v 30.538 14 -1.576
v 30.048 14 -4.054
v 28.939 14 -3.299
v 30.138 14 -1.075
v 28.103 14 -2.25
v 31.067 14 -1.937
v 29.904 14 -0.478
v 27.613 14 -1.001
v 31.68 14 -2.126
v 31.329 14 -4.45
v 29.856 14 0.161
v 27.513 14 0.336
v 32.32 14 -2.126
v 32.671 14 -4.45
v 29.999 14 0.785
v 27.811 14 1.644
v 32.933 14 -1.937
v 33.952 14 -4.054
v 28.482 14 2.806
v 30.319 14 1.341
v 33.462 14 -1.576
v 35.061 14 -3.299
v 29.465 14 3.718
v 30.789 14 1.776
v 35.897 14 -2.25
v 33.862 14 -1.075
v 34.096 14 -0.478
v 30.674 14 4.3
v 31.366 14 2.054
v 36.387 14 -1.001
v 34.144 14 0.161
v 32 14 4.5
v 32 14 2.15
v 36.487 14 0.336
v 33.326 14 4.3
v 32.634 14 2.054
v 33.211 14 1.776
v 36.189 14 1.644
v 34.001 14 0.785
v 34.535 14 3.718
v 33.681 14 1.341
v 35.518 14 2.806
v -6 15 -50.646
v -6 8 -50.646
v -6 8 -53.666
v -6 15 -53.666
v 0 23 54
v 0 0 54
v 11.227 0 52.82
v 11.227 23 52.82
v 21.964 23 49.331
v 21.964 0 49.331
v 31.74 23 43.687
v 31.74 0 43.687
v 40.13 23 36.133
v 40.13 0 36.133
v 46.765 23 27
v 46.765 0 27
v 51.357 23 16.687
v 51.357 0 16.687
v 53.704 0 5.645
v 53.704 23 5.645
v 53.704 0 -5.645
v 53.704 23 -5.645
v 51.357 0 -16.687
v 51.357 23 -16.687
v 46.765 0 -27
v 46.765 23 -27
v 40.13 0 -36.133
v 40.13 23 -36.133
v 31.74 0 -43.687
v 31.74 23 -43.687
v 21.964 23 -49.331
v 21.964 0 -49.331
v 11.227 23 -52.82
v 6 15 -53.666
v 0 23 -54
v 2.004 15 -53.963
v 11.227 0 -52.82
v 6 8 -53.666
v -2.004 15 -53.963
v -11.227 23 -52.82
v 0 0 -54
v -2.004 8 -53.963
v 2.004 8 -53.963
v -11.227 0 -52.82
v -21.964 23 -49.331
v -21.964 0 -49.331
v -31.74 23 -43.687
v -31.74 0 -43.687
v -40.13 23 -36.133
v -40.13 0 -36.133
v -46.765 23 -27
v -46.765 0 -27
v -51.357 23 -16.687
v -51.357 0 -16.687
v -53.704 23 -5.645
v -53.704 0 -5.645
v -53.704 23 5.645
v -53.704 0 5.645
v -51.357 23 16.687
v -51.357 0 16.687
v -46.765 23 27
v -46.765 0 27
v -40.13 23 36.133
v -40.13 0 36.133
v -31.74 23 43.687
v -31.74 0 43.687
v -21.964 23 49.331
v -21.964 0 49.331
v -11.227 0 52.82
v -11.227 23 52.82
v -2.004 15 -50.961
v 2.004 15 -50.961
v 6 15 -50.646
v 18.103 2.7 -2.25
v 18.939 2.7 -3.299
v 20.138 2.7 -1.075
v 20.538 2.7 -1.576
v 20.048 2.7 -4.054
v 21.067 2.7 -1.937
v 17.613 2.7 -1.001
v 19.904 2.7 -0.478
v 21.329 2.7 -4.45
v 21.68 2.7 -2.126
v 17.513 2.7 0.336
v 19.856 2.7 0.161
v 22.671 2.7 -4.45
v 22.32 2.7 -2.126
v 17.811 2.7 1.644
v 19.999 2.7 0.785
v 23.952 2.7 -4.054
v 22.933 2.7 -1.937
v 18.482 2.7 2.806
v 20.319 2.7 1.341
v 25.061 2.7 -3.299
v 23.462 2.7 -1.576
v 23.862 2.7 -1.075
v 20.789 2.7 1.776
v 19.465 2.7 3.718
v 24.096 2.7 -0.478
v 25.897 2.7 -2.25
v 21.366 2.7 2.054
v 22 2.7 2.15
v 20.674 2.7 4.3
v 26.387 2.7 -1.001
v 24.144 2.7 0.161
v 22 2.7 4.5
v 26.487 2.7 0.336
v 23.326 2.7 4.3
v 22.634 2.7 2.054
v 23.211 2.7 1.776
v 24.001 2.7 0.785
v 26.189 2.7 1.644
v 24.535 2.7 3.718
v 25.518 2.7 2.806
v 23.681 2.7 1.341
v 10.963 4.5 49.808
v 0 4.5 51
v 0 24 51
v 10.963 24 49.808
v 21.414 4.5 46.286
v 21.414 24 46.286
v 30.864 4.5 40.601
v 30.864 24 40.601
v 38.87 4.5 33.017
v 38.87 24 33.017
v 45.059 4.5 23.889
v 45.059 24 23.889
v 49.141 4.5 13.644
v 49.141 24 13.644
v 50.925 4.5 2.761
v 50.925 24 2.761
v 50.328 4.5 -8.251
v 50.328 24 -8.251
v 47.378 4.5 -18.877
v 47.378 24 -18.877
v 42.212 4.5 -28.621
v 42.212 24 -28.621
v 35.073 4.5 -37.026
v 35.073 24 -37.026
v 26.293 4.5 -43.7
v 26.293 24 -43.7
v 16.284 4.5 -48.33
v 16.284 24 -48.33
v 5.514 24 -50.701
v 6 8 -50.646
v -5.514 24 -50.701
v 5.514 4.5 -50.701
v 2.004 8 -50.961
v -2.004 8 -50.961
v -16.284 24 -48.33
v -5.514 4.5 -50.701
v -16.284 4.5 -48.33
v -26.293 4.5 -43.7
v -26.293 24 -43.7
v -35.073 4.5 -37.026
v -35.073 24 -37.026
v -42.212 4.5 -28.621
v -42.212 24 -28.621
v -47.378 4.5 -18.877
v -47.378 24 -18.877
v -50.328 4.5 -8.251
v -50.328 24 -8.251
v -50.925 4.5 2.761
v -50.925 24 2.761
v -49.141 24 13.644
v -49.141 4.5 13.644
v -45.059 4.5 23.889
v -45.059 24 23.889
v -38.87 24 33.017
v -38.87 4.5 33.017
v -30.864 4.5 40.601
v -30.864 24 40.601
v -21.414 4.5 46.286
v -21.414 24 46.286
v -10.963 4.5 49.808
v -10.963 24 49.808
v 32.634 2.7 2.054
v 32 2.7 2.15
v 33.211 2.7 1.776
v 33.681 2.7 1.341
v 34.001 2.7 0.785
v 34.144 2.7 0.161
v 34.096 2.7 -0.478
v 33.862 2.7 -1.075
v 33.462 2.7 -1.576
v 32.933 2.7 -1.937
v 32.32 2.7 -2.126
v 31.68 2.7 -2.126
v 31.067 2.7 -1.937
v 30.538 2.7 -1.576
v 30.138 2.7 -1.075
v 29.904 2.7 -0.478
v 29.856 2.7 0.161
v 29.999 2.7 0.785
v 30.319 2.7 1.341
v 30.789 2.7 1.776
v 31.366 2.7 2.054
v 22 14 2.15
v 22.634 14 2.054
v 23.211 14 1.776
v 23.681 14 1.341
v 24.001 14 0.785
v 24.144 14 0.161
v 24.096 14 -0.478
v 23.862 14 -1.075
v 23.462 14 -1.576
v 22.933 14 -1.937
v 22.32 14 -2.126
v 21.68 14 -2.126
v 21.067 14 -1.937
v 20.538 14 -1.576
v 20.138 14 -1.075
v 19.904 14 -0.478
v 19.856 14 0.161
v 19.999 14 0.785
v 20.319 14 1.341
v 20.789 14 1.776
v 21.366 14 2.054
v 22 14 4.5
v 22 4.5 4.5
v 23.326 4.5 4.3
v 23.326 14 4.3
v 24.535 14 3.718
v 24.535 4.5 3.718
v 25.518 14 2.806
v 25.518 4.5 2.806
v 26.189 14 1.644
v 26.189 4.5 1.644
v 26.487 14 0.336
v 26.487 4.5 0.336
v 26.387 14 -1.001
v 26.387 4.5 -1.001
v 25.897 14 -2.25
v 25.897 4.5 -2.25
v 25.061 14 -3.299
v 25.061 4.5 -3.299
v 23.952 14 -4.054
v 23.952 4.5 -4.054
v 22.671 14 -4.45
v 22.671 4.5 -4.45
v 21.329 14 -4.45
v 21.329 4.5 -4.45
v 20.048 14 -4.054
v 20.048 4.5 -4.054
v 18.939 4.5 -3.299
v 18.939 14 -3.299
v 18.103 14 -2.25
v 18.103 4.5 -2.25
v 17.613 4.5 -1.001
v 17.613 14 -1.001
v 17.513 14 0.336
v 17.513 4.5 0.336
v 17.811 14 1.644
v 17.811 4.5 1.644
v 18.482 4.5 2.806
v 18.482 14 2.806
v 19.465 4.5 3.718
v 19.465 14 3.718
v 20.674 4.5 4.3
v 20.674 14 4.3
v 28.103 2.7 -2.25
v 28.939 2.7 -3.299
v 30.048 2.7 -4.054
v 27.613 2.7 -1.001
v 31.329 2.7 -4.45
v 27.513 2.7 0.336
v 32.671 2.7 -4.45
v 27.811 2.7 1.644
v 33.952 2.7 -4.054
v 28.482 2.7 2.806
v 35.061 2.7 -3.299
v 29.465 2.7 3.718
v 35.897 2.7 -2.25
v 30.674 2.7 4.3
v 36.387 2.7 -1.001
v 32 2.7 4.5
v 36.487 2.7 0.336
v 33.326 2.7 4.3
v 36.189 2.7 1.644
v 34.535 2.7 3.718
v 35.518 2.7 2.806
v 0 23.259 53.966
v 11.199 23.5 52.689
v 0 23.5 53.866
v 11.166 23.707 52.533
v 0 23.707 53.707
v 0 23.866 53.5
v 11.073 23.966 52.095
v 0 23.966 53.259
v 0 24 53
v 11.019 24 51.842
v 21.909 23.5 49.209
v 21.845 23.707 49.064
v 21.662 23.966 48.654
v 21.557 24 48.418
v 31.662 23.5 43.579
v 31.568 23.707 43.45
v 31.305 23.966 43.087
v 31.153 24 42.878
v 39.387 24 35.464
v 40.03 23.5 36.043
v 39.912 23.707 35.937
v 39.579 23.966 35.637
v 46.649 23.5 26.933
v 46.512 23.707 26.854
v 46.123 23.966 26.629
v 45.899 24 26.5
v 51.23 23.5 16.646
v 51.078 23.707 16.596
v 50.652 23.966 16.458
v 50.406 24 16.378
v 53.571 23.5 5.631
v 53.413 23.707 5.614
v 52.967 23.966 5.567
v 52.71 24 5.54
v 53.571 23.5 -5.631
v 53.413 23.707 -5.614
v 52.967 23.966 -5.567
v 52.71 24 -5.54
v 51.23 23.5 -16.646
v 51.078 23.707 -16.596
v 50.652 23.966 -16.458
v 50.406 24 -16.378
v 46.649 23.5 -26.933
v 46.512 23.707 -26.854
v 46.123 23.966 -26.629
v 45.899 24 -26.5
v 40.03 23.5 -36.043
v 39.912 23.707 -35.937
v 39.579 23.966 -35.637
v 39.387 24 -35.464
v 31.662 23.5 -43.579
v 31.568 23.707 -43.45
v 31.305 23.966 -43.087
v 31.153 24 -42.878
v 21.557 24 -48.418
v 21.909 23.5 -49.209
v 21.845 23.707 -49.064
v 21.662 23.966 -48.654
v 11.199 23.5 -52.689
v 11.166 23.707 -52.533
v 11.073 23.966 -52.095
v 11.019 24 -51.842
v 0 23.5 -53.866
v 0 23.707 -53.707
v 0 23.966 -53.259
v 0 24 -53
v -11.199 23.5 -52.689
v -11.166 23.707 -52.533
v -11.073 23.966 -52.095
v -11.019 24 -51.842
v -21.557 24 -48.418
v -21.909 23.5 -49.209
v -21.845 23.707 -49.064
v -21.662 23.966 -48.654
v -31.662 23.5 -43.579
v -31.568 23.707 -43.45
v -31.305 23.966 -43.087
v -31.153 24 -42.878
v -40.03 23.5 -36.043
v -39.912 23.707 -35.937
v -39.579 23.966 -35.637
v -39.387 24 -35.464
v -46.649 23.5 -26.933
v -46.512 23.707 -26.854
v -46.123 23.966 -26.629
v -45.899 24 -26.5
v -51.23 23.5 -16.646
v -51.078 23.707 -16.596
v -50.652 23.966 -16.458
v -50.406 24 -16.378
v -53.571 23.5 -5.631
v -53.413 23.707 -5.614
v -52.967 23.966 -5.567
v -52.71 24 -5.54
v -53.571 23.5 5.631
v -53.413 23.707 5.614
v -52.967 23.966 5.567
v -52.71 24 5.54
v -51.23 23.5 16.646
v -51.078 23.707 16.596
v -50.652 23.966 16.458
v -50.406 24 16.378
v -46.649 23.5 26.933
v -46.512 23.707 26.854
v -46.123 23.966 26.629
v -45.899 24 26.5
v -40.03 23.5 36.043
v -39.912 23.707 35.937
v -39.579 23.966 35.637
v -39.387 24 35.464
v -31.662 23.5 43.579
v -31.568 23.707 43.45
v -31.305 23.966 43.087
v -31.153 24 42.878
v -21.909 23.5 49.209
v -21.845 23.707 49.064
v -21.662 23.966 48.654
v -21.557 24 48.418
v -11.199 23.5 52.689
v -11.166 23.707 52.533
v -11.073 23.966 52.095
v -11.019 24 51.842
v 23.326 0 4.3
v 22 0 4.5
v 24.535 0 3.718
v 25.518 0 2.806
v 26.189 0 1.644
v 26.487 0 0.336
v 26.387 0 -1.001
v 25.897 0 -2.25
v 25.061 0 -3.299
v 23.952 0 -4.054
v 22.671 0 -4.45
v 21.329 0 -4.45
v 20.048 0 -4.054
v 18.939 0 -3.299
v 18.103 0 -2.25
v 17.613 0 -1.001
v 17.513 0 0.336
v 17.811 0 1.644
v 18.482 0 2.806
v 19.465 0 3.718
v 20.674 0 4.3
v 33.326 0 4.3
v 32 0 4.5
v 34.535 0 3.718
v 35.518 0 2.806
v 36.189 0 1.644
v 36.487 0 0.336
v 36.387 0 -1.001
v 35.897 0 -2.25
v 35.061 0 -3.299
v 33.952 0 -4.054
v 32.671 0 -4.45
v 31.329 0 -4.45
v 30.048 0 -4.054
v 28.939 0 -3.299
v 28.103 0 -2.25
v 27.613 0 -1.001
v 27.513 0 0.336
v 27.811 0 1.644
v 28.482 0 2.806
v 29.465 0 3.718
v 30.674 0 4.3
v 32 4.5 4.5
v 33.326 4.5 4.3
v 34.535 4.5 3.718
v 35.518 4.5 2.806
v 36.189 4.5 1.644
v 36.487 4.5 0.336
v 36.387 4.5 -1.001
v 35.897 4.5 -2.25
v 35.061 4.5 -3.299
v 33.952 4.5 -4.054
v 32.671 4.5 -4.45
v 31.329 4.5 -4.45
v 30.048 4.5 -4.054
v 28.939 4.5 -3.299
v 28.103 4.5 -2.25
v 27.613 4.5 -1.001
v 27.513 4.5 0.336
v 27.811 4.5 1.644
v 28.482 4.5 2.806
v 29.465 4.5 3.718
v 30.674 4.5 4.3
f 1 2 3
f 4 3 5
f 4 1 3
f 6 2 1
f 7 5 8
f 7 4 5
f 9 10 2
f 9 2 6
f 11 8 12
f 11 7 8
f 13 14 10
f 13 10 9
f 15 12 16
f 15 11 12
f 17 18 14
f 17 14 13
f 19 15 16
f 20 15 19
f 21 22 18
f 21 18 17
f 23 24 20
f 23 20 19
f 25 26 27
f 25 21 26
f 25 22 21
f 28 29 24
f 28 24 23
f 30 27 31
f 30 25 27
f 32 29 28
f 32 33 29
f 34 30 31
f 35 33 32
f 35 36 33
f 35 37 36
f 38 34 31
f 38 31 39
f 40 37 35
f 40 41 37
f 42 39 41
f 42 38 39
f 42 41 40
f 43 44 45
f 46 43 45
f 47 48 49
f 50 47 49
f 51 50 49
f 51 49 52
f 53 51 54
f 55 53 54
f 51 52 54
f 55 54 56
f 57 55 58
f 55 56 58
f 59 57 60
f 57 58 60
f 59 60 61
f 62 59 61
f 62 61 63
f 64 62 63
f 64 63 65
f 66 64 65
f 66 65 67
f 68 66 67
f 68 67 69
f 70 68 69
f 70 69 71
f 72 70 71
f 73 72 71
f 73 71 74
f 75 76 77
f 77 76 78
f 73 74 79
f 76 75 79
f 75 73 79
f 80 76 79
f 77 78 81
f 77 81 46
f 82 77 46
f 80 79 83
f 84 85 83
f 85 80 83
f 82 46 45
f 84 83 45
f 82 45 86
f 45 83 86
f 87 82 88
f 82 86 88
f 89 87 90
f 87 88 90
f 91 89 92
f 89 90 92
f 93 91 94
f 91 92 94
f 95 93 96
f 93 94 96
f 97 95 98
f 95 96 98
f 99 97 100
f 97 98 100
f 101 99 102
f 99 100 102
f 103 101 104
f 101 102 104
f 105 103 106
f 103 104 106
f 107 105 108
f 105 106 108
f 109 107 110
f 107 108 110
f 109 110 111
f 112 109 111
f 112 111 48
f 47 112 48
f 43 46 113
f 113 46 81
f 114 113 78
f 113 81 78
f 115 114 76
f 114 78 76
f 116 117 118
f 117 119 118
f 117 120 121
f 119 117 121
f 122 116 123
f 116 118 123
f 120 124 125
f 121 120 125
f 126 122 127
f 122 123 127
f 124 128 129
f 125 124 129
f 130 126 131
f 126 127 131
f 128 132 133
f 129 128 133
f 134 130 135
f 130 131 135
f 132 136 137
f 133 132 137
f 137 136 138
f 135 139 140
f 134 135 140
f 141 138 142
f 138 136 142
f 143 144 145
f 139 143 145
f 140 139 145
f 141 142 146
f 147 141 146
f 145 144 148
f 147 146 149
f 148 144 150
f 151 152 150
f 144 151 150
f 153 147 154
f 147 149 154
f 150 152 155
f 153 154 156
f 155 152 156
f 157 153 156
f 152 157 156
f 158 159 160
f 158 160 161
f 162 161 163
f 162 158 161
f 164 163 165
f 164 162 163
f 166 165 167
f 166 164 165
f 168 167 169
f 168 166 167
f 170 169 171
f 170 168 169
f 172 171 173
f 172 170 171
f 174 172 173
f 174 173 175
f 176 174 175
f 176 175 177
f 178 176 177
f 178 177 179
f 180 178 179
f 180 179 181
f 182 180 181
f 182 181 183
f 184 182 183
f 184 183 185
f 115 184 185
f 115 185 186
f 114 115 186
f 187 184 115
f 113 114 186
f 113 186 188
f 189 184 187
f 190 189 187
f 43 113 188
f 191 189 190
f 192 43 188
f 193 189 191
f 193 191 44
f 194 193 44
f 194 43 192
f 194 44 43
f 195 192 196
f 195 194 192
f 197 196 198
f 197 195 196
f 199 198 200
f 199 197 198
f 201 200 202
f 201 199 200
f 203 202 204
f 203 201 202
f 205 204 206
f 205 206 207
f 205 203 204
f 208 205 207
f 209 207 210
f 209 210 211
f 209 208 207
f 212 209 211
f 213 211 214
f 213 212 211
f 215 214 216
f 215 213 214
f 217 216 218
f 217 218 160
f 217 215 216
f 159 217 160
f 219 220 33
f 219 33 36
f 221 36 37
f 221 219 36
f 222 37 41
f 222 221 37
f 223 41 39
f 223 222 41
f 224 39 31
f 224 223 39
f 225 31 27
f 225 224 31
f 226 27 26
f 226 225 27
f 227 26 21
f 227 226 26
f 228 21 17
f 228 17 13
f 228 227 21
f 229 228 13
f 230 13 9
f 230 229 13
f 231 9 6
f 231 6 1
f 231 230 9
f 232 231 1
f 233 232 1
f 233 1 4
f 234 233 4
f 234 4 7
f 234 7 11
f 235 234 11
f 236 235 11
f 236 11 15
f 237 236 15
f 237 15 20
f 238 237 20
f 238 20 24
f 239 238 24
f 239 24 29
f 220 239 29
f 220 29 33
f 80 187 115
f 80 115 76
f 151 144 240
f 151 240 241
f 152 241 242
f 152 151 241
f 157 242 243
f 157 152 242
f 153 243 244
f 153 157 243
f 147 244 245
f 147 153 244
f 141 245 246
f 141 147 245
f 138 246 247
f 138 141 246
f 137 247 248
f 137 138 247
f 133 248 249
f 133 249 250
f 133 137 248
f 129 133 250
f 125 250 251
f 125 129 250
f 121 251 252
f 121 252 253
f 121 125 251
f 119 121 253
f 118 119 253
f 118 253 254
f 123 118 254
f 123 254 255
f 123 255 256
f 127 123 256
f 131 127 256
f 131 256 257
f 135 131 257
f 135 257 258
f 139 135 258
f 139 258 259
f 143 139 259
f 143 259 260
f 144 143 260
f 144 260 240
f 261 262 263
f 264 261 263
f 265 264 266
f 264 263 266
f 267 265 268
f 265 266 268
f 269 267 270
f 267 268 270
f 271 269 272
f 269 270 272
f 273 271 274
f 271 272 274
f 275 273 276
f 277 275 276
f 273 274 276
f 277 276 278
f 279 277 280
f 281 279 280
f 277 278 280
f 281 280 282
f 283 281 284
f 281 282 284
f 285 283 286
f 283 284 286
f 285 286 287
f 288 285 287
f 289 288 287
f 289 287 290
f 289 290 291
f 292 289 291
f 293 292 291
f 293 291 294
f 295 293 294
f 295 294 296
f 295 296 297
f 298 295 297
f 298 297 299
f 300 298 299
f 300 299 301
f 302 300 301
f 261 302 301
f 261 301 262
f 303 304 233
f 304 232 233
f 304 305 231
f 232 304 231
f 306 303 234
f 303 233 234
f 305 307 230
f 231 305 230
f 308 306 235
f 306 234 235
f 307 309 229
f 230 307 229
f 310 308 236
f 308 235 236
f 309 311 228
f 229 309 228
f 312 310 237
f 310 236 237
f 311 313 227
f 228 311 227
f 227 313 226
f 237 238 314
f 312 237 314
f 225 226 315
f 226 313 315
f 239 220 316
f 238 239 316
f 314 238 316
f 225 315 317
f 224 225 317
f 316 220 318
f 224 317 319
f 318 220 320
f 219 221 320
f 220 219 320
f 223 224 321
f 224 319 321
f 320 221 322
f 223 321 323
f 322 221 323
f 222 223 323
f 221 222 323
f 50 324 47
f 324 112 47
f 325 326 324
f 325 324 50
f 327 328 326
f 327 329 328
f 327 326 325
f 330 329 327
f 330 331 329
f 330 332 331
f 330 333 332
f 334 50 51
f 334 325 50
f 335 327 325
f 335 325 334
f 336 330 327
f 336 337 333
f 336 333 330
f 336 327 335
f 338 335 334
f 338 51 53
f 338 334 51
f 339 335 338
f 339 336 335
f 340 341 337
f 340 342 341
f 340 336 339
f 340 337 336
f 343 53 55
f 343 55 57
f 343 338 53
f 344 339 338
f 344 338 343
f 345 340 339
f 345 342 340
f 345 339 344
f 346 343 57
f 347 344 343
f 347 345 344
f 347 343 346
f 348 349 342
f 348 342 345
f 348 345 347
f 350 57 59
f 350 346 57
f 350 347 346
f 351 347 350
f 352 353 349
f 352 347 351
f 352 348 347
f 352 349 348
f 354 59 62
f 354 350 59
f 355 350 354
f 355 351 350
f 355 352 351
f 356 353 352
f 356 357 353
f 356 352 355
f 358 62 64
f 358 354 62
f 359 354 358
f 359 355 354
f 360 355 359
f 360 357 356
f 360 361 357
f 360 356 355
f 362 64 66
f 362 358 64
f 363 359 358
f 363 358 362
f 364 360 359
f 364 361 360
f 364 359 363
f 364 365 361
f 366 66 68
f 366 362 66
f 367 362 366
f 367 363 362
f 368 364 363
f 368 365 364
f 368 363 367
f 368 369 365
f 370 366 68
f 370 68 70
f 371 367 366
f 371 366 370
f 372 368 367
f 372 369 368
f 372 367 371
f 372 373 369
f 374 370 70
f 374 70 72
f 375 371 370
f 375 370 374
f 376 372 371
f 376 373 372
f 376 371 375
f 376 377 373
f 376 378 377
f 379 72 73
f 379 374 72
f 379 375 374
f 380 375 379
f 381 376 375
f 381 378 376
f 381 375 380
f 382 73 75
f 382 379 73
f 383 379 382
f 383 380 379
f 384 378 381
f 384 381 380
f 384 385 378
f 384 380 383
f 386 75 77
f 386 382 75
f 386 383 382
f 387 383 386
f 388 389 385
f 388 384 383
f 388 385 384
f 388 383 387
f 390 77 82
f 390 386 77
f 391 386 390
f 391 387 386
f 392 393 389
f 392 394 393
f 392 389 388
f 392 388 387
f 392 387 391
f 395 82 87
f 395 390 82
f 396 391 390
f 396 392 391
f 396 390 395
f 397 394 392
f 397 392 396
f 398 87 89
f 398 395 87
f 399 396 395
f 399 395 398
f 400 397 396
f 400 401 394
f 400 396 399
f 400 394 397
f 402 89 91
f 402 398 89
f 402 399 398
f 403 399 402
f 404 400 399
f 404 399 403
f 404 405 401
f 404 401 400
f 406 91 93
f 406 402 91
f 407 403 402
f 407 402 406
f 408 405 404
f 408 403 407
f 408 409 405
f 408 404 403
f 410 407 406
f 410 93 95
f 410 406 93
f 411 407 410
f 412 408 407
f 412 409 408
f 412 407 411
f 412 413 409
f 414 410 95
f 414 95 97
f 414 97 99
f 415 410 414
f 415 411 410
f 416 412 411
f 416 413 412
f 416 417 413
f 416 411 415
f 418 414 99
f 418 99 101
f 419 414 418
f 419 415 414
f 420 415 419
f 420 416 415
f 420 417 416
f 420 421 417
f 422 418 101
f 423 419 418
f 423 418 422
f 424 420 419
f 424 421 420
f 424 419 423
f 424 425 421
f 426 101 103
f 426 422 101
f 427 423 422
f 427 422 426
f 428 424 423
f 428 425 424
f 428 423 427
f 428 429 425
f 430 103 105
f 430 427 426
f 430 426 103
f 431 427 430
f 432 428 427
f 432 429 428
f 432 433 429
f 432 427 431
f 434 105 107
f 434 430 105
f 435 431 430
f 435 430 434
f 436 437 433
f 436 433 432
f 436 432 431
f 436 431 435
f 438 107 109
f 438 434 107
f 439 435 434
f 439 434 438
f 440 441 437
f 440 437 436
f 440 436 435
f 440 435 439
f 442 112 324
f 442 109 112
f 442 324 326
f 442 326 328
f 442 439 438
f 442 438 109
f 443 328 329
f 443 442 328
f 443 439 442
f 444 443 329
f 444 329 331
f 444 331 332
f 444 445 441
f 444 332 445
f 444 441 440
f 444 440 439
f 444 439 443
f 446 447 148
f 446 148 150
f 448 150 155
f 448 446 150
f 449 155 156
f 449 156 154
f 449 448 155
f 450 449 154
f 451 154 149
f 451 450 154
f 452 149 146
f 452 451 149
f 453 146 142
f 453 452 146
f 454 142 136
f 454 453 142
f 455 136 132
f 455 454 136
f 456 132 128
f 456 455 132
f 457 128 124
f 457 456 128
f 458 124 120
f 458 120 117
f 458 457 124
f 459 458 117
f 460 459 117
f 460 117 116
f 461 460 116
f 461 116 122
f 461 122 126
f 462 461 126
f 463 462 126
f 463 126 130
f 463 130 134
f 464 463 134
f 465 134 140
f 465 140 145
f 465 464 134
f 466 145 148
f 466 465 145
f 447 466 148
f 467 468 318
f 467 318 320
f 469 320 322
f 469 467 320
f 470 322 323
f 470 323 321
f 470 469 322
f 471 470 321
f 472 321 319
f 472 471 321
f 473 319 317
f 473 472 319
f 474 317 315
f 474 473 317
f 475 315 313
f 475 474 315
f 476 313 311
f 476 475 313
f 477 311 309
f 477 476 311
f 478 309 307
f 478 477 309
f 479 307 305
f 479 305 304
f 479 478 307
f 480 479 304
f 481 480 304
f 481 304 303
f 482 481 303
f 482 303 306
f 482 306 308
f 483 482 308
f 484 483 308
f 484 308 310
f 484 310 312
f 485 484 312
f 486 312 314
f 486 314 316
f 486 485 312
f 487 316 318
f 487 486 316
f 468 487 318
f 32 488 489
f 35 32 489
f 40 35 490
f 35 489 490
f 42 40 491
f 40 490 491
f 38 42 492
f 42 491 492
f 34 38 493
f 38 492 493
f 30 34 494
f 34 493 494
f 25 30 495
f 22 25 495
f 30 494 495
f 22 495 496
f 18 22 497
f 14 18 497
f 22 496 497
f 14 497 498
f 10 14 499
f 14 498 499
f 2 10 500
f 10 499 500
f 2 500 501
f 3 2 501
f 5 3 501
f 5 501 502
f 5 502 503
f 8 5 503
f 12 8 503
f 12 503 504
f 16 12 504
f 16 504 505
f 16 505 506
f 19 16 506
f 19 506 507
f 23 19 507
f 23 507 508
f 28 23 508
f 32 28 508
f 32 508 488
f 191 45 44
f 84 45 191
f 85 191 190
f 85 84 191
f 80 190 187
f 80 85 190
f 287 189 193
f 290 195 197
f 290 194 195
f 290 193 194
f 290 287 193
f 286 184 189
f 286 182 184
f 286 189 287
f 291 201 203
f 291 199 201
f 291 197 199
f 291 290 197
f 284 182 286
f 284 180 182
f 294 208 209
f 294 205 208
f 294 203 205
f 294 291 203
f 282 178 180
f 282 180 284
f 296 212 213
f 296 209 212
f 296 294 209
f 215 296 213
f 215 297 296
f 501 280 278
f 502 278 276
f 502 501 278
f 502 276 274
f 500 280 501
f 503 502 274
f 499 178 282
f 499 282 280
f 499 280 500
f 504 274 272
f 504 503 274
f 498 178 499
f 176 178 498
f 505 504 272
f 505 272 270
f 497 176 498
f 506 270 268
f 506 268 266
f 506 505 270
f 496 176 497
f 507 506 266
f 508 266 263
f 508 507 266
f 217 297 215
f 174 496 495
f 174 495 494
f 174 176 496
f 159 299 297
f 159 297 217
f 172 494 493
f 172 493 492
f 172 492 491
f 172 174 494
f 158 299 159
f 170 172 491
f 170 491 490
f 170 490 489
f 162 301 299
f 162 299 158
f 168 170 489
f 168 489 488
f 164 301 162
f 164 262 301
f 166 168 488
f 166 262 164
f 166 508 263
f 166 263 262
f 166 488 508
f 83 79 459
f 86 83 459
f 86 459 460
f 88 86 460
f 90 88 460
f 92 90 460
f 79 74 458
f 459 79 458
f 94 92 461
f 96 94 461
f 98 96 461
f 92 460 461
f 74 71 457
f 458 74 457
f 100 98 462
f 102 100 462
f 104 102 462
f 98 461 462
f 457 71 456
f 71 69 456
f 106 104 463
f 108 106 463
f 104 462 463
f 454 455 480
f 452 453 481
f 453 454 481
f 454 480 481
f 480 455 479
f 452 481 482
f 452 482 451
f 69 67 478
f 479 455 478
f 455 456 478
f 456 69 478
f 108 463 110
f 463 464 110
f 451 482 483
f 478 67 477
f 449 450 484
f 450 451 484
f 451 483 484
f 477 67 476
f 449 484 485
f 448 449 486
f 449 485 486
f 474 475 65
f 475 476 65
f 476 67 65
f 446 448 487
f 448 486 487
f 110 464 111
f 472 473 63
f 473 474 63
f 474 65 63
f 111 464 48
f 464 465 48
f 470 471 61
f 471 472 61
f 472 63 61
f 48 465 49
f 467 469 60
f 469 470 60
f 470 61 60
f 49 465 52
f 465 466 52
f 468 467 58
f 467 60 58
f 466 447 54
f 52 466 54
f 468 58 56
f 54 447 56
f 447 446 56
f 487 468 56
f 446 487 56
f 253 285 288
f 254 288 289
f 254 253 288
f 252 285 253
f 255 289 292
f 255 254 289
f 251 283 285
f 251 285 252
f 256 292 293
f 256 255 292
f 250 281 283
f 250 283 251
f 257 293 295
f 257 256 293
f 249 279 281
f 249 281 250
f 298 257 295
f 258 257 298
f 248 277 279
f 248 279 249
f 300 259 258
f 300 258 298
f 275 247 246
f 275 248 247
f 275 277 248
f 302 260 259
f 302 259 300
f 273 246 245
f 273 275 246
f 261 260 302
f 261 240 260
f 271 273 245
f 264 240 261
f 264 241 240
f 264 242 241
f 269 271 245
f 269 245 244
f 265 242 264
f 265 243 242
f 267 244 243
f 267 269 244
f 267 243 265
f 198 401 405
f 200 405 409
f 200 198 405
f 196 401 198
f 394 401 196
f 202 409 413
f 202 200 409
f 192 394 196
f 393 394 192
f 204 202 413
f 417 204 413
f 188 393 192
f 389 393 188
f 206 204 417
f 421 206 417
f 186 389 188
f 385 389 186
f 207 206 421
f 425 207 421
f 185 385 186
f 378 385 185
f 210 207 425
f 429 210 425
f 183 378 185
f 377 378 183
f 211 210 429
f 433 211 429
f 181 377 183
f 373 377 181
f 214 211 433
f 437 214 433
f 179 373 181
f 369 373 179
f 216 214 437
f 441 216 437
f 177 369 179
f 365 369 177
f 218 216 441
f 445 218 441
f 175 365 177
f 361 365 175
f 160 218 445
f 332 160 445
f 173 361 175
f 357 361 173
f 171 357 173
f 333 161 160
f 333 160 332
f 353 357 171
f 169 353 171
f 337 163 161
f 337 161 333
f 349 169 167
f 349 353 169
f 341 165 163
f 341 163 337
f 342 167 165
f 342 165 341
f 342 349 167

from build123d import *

# Parameters (mm, degrees)
SKETCH_1_R                           = 54
FLOOR_D108_T4P5_DEPTH                = 4.5
SKETCH_2_R                           = 54
SKETCH_2_R_2                         = 51
RIM_OD108_ID102_H24_DEPTH            = 24
SKETCH_3_R                           = 4.5
SENSOR_FIXED_POSTS_DEPTH             = 14
SKETCH_4_R                           = 2.15
M4_FIXED_MOUNT_CLEARANCE_DEPTH       = 14
SKETCH_5_R                           = 4.5
M4_FIXED_HEAD_RECESS_D8P2_T2P7_DEPTH = 2.7
SKETCH_6_W                           = 12
SKETCH_6_H                           = 11
USB_C_SIDE_OPENING_12X7_DEPTH        = 7
BASE_OUTER_ROUND_R1_R                = 1


with BuildPart() as part:
    # 草图1 → Floor_D108_T4p5 (new body)
    with BuildSketch(Plane(origin=(0, 0, 0), x_dir=(1, 0, 0), z_dir=(0, 1, 0))):
        with Locations(Location((0, 0, 0), (0, 0, 270))):
            Circle(SKETCH_1_R)
    extrude(amount=FLOOR_D108_T4P5_DEPTH)

    # 草图2 → Rim_OD108_ID102_H24 (add)
    with BuildSketch(Plane(origin=(0, 0, 0), x_dir=(1, 0, 0), z_dir=(0, 1, 0))):
        with Locations(Location((0, 0, 0), (0, 0, 270))):
            Circle(SKETCH_2_R)
        with Locations(Location((0, 0, 0), (0, 0, 270))):
            Circle(SKETCH_2_R_2, mode=Mode.SUBTRACT)
    extrude(amount=RIM_OD108_ID102_H24_DEPTH)

    # 草图3 → Sensor_fixed_posts (add)
    with BuildSketch(Plane(origin=(0, 0, 0), x_dir=(1, 0, 0), z_dir=(0, 1, 0))):
        with Locations(Location((22, 0, 0), (0, 0, 270))):
            Circle(SKETCH_3_R)
        with Locations(Location((32, 0, 0), (0, 0, 270))):
            Circle(SKETCH_3_R)
    extrude(amount=SENSOR_FIXED_POSTS_DEPTH)

    # 草图4 → M4_fixed_mount_clearance (cut)
    with BuildSketch(Plane(origin=(0, 0, 0), x_dir=(1, 0, 0), z_dir=(0, 1, 0))):
        with Locations(Location((22, 0, 0), (0, 0, 270))):
            Circle(SKETCH_4_R)
        with Locations(Location((32, 0, 0), (0, 0, 270))):
            Circle(SKETCH_4_R)
    extrude(amount=M4_FIXED_MOUNT_CLEARANCE_DEPTH, mode=Mode.SUBTRACT)

    # 草图5 → M4_fixed_head_recess_D8p2_T2p7 (cut)
    with BuildSketch(Plane(origin=(0, 0, 0), x_dir=(1, 0, 0), z_dir=(0, 1, 0))):
        with Locations(Location((22, 0, 0), (0, 0, 270))):
            Circle(SKETCH_5_R)
        with Locations(Location((32, 0, 0), (0, 0, 270))):
            Circle(SKETCH_5_R)
    extrude(amount=M4_FIXED_HEAD_RECESS_D8P2_T2P7_DEPTH, mode=Mode.SUBTRACT)

    # 草图6 → USB_C_side_opening_12x7 (cut)
    with BuildSketch(Plane(origin=(0, 8, 0), x_dir=(1, 0, 0), z_dir=(0, 1, 0))):
        with Locations((0, 54.5)):
            Rectangle(SKETCH_6_W, SKETCH_6_H)
    extrude(amount=USB_C_SIDE_OPENING_12X7_DEPTH, mode=Mode.SUBTRACT)

    # Base_outer_round_R1
    base_outer_round_r1_edges = [part.edges().sort_by_distance(p)[0] for p in [
        (0, 24, -54),
    ]]
    fillet(base_outer_round_r1_edges, radius=BASE_OUTER_ROUND_R1_R)


solid = part.part
